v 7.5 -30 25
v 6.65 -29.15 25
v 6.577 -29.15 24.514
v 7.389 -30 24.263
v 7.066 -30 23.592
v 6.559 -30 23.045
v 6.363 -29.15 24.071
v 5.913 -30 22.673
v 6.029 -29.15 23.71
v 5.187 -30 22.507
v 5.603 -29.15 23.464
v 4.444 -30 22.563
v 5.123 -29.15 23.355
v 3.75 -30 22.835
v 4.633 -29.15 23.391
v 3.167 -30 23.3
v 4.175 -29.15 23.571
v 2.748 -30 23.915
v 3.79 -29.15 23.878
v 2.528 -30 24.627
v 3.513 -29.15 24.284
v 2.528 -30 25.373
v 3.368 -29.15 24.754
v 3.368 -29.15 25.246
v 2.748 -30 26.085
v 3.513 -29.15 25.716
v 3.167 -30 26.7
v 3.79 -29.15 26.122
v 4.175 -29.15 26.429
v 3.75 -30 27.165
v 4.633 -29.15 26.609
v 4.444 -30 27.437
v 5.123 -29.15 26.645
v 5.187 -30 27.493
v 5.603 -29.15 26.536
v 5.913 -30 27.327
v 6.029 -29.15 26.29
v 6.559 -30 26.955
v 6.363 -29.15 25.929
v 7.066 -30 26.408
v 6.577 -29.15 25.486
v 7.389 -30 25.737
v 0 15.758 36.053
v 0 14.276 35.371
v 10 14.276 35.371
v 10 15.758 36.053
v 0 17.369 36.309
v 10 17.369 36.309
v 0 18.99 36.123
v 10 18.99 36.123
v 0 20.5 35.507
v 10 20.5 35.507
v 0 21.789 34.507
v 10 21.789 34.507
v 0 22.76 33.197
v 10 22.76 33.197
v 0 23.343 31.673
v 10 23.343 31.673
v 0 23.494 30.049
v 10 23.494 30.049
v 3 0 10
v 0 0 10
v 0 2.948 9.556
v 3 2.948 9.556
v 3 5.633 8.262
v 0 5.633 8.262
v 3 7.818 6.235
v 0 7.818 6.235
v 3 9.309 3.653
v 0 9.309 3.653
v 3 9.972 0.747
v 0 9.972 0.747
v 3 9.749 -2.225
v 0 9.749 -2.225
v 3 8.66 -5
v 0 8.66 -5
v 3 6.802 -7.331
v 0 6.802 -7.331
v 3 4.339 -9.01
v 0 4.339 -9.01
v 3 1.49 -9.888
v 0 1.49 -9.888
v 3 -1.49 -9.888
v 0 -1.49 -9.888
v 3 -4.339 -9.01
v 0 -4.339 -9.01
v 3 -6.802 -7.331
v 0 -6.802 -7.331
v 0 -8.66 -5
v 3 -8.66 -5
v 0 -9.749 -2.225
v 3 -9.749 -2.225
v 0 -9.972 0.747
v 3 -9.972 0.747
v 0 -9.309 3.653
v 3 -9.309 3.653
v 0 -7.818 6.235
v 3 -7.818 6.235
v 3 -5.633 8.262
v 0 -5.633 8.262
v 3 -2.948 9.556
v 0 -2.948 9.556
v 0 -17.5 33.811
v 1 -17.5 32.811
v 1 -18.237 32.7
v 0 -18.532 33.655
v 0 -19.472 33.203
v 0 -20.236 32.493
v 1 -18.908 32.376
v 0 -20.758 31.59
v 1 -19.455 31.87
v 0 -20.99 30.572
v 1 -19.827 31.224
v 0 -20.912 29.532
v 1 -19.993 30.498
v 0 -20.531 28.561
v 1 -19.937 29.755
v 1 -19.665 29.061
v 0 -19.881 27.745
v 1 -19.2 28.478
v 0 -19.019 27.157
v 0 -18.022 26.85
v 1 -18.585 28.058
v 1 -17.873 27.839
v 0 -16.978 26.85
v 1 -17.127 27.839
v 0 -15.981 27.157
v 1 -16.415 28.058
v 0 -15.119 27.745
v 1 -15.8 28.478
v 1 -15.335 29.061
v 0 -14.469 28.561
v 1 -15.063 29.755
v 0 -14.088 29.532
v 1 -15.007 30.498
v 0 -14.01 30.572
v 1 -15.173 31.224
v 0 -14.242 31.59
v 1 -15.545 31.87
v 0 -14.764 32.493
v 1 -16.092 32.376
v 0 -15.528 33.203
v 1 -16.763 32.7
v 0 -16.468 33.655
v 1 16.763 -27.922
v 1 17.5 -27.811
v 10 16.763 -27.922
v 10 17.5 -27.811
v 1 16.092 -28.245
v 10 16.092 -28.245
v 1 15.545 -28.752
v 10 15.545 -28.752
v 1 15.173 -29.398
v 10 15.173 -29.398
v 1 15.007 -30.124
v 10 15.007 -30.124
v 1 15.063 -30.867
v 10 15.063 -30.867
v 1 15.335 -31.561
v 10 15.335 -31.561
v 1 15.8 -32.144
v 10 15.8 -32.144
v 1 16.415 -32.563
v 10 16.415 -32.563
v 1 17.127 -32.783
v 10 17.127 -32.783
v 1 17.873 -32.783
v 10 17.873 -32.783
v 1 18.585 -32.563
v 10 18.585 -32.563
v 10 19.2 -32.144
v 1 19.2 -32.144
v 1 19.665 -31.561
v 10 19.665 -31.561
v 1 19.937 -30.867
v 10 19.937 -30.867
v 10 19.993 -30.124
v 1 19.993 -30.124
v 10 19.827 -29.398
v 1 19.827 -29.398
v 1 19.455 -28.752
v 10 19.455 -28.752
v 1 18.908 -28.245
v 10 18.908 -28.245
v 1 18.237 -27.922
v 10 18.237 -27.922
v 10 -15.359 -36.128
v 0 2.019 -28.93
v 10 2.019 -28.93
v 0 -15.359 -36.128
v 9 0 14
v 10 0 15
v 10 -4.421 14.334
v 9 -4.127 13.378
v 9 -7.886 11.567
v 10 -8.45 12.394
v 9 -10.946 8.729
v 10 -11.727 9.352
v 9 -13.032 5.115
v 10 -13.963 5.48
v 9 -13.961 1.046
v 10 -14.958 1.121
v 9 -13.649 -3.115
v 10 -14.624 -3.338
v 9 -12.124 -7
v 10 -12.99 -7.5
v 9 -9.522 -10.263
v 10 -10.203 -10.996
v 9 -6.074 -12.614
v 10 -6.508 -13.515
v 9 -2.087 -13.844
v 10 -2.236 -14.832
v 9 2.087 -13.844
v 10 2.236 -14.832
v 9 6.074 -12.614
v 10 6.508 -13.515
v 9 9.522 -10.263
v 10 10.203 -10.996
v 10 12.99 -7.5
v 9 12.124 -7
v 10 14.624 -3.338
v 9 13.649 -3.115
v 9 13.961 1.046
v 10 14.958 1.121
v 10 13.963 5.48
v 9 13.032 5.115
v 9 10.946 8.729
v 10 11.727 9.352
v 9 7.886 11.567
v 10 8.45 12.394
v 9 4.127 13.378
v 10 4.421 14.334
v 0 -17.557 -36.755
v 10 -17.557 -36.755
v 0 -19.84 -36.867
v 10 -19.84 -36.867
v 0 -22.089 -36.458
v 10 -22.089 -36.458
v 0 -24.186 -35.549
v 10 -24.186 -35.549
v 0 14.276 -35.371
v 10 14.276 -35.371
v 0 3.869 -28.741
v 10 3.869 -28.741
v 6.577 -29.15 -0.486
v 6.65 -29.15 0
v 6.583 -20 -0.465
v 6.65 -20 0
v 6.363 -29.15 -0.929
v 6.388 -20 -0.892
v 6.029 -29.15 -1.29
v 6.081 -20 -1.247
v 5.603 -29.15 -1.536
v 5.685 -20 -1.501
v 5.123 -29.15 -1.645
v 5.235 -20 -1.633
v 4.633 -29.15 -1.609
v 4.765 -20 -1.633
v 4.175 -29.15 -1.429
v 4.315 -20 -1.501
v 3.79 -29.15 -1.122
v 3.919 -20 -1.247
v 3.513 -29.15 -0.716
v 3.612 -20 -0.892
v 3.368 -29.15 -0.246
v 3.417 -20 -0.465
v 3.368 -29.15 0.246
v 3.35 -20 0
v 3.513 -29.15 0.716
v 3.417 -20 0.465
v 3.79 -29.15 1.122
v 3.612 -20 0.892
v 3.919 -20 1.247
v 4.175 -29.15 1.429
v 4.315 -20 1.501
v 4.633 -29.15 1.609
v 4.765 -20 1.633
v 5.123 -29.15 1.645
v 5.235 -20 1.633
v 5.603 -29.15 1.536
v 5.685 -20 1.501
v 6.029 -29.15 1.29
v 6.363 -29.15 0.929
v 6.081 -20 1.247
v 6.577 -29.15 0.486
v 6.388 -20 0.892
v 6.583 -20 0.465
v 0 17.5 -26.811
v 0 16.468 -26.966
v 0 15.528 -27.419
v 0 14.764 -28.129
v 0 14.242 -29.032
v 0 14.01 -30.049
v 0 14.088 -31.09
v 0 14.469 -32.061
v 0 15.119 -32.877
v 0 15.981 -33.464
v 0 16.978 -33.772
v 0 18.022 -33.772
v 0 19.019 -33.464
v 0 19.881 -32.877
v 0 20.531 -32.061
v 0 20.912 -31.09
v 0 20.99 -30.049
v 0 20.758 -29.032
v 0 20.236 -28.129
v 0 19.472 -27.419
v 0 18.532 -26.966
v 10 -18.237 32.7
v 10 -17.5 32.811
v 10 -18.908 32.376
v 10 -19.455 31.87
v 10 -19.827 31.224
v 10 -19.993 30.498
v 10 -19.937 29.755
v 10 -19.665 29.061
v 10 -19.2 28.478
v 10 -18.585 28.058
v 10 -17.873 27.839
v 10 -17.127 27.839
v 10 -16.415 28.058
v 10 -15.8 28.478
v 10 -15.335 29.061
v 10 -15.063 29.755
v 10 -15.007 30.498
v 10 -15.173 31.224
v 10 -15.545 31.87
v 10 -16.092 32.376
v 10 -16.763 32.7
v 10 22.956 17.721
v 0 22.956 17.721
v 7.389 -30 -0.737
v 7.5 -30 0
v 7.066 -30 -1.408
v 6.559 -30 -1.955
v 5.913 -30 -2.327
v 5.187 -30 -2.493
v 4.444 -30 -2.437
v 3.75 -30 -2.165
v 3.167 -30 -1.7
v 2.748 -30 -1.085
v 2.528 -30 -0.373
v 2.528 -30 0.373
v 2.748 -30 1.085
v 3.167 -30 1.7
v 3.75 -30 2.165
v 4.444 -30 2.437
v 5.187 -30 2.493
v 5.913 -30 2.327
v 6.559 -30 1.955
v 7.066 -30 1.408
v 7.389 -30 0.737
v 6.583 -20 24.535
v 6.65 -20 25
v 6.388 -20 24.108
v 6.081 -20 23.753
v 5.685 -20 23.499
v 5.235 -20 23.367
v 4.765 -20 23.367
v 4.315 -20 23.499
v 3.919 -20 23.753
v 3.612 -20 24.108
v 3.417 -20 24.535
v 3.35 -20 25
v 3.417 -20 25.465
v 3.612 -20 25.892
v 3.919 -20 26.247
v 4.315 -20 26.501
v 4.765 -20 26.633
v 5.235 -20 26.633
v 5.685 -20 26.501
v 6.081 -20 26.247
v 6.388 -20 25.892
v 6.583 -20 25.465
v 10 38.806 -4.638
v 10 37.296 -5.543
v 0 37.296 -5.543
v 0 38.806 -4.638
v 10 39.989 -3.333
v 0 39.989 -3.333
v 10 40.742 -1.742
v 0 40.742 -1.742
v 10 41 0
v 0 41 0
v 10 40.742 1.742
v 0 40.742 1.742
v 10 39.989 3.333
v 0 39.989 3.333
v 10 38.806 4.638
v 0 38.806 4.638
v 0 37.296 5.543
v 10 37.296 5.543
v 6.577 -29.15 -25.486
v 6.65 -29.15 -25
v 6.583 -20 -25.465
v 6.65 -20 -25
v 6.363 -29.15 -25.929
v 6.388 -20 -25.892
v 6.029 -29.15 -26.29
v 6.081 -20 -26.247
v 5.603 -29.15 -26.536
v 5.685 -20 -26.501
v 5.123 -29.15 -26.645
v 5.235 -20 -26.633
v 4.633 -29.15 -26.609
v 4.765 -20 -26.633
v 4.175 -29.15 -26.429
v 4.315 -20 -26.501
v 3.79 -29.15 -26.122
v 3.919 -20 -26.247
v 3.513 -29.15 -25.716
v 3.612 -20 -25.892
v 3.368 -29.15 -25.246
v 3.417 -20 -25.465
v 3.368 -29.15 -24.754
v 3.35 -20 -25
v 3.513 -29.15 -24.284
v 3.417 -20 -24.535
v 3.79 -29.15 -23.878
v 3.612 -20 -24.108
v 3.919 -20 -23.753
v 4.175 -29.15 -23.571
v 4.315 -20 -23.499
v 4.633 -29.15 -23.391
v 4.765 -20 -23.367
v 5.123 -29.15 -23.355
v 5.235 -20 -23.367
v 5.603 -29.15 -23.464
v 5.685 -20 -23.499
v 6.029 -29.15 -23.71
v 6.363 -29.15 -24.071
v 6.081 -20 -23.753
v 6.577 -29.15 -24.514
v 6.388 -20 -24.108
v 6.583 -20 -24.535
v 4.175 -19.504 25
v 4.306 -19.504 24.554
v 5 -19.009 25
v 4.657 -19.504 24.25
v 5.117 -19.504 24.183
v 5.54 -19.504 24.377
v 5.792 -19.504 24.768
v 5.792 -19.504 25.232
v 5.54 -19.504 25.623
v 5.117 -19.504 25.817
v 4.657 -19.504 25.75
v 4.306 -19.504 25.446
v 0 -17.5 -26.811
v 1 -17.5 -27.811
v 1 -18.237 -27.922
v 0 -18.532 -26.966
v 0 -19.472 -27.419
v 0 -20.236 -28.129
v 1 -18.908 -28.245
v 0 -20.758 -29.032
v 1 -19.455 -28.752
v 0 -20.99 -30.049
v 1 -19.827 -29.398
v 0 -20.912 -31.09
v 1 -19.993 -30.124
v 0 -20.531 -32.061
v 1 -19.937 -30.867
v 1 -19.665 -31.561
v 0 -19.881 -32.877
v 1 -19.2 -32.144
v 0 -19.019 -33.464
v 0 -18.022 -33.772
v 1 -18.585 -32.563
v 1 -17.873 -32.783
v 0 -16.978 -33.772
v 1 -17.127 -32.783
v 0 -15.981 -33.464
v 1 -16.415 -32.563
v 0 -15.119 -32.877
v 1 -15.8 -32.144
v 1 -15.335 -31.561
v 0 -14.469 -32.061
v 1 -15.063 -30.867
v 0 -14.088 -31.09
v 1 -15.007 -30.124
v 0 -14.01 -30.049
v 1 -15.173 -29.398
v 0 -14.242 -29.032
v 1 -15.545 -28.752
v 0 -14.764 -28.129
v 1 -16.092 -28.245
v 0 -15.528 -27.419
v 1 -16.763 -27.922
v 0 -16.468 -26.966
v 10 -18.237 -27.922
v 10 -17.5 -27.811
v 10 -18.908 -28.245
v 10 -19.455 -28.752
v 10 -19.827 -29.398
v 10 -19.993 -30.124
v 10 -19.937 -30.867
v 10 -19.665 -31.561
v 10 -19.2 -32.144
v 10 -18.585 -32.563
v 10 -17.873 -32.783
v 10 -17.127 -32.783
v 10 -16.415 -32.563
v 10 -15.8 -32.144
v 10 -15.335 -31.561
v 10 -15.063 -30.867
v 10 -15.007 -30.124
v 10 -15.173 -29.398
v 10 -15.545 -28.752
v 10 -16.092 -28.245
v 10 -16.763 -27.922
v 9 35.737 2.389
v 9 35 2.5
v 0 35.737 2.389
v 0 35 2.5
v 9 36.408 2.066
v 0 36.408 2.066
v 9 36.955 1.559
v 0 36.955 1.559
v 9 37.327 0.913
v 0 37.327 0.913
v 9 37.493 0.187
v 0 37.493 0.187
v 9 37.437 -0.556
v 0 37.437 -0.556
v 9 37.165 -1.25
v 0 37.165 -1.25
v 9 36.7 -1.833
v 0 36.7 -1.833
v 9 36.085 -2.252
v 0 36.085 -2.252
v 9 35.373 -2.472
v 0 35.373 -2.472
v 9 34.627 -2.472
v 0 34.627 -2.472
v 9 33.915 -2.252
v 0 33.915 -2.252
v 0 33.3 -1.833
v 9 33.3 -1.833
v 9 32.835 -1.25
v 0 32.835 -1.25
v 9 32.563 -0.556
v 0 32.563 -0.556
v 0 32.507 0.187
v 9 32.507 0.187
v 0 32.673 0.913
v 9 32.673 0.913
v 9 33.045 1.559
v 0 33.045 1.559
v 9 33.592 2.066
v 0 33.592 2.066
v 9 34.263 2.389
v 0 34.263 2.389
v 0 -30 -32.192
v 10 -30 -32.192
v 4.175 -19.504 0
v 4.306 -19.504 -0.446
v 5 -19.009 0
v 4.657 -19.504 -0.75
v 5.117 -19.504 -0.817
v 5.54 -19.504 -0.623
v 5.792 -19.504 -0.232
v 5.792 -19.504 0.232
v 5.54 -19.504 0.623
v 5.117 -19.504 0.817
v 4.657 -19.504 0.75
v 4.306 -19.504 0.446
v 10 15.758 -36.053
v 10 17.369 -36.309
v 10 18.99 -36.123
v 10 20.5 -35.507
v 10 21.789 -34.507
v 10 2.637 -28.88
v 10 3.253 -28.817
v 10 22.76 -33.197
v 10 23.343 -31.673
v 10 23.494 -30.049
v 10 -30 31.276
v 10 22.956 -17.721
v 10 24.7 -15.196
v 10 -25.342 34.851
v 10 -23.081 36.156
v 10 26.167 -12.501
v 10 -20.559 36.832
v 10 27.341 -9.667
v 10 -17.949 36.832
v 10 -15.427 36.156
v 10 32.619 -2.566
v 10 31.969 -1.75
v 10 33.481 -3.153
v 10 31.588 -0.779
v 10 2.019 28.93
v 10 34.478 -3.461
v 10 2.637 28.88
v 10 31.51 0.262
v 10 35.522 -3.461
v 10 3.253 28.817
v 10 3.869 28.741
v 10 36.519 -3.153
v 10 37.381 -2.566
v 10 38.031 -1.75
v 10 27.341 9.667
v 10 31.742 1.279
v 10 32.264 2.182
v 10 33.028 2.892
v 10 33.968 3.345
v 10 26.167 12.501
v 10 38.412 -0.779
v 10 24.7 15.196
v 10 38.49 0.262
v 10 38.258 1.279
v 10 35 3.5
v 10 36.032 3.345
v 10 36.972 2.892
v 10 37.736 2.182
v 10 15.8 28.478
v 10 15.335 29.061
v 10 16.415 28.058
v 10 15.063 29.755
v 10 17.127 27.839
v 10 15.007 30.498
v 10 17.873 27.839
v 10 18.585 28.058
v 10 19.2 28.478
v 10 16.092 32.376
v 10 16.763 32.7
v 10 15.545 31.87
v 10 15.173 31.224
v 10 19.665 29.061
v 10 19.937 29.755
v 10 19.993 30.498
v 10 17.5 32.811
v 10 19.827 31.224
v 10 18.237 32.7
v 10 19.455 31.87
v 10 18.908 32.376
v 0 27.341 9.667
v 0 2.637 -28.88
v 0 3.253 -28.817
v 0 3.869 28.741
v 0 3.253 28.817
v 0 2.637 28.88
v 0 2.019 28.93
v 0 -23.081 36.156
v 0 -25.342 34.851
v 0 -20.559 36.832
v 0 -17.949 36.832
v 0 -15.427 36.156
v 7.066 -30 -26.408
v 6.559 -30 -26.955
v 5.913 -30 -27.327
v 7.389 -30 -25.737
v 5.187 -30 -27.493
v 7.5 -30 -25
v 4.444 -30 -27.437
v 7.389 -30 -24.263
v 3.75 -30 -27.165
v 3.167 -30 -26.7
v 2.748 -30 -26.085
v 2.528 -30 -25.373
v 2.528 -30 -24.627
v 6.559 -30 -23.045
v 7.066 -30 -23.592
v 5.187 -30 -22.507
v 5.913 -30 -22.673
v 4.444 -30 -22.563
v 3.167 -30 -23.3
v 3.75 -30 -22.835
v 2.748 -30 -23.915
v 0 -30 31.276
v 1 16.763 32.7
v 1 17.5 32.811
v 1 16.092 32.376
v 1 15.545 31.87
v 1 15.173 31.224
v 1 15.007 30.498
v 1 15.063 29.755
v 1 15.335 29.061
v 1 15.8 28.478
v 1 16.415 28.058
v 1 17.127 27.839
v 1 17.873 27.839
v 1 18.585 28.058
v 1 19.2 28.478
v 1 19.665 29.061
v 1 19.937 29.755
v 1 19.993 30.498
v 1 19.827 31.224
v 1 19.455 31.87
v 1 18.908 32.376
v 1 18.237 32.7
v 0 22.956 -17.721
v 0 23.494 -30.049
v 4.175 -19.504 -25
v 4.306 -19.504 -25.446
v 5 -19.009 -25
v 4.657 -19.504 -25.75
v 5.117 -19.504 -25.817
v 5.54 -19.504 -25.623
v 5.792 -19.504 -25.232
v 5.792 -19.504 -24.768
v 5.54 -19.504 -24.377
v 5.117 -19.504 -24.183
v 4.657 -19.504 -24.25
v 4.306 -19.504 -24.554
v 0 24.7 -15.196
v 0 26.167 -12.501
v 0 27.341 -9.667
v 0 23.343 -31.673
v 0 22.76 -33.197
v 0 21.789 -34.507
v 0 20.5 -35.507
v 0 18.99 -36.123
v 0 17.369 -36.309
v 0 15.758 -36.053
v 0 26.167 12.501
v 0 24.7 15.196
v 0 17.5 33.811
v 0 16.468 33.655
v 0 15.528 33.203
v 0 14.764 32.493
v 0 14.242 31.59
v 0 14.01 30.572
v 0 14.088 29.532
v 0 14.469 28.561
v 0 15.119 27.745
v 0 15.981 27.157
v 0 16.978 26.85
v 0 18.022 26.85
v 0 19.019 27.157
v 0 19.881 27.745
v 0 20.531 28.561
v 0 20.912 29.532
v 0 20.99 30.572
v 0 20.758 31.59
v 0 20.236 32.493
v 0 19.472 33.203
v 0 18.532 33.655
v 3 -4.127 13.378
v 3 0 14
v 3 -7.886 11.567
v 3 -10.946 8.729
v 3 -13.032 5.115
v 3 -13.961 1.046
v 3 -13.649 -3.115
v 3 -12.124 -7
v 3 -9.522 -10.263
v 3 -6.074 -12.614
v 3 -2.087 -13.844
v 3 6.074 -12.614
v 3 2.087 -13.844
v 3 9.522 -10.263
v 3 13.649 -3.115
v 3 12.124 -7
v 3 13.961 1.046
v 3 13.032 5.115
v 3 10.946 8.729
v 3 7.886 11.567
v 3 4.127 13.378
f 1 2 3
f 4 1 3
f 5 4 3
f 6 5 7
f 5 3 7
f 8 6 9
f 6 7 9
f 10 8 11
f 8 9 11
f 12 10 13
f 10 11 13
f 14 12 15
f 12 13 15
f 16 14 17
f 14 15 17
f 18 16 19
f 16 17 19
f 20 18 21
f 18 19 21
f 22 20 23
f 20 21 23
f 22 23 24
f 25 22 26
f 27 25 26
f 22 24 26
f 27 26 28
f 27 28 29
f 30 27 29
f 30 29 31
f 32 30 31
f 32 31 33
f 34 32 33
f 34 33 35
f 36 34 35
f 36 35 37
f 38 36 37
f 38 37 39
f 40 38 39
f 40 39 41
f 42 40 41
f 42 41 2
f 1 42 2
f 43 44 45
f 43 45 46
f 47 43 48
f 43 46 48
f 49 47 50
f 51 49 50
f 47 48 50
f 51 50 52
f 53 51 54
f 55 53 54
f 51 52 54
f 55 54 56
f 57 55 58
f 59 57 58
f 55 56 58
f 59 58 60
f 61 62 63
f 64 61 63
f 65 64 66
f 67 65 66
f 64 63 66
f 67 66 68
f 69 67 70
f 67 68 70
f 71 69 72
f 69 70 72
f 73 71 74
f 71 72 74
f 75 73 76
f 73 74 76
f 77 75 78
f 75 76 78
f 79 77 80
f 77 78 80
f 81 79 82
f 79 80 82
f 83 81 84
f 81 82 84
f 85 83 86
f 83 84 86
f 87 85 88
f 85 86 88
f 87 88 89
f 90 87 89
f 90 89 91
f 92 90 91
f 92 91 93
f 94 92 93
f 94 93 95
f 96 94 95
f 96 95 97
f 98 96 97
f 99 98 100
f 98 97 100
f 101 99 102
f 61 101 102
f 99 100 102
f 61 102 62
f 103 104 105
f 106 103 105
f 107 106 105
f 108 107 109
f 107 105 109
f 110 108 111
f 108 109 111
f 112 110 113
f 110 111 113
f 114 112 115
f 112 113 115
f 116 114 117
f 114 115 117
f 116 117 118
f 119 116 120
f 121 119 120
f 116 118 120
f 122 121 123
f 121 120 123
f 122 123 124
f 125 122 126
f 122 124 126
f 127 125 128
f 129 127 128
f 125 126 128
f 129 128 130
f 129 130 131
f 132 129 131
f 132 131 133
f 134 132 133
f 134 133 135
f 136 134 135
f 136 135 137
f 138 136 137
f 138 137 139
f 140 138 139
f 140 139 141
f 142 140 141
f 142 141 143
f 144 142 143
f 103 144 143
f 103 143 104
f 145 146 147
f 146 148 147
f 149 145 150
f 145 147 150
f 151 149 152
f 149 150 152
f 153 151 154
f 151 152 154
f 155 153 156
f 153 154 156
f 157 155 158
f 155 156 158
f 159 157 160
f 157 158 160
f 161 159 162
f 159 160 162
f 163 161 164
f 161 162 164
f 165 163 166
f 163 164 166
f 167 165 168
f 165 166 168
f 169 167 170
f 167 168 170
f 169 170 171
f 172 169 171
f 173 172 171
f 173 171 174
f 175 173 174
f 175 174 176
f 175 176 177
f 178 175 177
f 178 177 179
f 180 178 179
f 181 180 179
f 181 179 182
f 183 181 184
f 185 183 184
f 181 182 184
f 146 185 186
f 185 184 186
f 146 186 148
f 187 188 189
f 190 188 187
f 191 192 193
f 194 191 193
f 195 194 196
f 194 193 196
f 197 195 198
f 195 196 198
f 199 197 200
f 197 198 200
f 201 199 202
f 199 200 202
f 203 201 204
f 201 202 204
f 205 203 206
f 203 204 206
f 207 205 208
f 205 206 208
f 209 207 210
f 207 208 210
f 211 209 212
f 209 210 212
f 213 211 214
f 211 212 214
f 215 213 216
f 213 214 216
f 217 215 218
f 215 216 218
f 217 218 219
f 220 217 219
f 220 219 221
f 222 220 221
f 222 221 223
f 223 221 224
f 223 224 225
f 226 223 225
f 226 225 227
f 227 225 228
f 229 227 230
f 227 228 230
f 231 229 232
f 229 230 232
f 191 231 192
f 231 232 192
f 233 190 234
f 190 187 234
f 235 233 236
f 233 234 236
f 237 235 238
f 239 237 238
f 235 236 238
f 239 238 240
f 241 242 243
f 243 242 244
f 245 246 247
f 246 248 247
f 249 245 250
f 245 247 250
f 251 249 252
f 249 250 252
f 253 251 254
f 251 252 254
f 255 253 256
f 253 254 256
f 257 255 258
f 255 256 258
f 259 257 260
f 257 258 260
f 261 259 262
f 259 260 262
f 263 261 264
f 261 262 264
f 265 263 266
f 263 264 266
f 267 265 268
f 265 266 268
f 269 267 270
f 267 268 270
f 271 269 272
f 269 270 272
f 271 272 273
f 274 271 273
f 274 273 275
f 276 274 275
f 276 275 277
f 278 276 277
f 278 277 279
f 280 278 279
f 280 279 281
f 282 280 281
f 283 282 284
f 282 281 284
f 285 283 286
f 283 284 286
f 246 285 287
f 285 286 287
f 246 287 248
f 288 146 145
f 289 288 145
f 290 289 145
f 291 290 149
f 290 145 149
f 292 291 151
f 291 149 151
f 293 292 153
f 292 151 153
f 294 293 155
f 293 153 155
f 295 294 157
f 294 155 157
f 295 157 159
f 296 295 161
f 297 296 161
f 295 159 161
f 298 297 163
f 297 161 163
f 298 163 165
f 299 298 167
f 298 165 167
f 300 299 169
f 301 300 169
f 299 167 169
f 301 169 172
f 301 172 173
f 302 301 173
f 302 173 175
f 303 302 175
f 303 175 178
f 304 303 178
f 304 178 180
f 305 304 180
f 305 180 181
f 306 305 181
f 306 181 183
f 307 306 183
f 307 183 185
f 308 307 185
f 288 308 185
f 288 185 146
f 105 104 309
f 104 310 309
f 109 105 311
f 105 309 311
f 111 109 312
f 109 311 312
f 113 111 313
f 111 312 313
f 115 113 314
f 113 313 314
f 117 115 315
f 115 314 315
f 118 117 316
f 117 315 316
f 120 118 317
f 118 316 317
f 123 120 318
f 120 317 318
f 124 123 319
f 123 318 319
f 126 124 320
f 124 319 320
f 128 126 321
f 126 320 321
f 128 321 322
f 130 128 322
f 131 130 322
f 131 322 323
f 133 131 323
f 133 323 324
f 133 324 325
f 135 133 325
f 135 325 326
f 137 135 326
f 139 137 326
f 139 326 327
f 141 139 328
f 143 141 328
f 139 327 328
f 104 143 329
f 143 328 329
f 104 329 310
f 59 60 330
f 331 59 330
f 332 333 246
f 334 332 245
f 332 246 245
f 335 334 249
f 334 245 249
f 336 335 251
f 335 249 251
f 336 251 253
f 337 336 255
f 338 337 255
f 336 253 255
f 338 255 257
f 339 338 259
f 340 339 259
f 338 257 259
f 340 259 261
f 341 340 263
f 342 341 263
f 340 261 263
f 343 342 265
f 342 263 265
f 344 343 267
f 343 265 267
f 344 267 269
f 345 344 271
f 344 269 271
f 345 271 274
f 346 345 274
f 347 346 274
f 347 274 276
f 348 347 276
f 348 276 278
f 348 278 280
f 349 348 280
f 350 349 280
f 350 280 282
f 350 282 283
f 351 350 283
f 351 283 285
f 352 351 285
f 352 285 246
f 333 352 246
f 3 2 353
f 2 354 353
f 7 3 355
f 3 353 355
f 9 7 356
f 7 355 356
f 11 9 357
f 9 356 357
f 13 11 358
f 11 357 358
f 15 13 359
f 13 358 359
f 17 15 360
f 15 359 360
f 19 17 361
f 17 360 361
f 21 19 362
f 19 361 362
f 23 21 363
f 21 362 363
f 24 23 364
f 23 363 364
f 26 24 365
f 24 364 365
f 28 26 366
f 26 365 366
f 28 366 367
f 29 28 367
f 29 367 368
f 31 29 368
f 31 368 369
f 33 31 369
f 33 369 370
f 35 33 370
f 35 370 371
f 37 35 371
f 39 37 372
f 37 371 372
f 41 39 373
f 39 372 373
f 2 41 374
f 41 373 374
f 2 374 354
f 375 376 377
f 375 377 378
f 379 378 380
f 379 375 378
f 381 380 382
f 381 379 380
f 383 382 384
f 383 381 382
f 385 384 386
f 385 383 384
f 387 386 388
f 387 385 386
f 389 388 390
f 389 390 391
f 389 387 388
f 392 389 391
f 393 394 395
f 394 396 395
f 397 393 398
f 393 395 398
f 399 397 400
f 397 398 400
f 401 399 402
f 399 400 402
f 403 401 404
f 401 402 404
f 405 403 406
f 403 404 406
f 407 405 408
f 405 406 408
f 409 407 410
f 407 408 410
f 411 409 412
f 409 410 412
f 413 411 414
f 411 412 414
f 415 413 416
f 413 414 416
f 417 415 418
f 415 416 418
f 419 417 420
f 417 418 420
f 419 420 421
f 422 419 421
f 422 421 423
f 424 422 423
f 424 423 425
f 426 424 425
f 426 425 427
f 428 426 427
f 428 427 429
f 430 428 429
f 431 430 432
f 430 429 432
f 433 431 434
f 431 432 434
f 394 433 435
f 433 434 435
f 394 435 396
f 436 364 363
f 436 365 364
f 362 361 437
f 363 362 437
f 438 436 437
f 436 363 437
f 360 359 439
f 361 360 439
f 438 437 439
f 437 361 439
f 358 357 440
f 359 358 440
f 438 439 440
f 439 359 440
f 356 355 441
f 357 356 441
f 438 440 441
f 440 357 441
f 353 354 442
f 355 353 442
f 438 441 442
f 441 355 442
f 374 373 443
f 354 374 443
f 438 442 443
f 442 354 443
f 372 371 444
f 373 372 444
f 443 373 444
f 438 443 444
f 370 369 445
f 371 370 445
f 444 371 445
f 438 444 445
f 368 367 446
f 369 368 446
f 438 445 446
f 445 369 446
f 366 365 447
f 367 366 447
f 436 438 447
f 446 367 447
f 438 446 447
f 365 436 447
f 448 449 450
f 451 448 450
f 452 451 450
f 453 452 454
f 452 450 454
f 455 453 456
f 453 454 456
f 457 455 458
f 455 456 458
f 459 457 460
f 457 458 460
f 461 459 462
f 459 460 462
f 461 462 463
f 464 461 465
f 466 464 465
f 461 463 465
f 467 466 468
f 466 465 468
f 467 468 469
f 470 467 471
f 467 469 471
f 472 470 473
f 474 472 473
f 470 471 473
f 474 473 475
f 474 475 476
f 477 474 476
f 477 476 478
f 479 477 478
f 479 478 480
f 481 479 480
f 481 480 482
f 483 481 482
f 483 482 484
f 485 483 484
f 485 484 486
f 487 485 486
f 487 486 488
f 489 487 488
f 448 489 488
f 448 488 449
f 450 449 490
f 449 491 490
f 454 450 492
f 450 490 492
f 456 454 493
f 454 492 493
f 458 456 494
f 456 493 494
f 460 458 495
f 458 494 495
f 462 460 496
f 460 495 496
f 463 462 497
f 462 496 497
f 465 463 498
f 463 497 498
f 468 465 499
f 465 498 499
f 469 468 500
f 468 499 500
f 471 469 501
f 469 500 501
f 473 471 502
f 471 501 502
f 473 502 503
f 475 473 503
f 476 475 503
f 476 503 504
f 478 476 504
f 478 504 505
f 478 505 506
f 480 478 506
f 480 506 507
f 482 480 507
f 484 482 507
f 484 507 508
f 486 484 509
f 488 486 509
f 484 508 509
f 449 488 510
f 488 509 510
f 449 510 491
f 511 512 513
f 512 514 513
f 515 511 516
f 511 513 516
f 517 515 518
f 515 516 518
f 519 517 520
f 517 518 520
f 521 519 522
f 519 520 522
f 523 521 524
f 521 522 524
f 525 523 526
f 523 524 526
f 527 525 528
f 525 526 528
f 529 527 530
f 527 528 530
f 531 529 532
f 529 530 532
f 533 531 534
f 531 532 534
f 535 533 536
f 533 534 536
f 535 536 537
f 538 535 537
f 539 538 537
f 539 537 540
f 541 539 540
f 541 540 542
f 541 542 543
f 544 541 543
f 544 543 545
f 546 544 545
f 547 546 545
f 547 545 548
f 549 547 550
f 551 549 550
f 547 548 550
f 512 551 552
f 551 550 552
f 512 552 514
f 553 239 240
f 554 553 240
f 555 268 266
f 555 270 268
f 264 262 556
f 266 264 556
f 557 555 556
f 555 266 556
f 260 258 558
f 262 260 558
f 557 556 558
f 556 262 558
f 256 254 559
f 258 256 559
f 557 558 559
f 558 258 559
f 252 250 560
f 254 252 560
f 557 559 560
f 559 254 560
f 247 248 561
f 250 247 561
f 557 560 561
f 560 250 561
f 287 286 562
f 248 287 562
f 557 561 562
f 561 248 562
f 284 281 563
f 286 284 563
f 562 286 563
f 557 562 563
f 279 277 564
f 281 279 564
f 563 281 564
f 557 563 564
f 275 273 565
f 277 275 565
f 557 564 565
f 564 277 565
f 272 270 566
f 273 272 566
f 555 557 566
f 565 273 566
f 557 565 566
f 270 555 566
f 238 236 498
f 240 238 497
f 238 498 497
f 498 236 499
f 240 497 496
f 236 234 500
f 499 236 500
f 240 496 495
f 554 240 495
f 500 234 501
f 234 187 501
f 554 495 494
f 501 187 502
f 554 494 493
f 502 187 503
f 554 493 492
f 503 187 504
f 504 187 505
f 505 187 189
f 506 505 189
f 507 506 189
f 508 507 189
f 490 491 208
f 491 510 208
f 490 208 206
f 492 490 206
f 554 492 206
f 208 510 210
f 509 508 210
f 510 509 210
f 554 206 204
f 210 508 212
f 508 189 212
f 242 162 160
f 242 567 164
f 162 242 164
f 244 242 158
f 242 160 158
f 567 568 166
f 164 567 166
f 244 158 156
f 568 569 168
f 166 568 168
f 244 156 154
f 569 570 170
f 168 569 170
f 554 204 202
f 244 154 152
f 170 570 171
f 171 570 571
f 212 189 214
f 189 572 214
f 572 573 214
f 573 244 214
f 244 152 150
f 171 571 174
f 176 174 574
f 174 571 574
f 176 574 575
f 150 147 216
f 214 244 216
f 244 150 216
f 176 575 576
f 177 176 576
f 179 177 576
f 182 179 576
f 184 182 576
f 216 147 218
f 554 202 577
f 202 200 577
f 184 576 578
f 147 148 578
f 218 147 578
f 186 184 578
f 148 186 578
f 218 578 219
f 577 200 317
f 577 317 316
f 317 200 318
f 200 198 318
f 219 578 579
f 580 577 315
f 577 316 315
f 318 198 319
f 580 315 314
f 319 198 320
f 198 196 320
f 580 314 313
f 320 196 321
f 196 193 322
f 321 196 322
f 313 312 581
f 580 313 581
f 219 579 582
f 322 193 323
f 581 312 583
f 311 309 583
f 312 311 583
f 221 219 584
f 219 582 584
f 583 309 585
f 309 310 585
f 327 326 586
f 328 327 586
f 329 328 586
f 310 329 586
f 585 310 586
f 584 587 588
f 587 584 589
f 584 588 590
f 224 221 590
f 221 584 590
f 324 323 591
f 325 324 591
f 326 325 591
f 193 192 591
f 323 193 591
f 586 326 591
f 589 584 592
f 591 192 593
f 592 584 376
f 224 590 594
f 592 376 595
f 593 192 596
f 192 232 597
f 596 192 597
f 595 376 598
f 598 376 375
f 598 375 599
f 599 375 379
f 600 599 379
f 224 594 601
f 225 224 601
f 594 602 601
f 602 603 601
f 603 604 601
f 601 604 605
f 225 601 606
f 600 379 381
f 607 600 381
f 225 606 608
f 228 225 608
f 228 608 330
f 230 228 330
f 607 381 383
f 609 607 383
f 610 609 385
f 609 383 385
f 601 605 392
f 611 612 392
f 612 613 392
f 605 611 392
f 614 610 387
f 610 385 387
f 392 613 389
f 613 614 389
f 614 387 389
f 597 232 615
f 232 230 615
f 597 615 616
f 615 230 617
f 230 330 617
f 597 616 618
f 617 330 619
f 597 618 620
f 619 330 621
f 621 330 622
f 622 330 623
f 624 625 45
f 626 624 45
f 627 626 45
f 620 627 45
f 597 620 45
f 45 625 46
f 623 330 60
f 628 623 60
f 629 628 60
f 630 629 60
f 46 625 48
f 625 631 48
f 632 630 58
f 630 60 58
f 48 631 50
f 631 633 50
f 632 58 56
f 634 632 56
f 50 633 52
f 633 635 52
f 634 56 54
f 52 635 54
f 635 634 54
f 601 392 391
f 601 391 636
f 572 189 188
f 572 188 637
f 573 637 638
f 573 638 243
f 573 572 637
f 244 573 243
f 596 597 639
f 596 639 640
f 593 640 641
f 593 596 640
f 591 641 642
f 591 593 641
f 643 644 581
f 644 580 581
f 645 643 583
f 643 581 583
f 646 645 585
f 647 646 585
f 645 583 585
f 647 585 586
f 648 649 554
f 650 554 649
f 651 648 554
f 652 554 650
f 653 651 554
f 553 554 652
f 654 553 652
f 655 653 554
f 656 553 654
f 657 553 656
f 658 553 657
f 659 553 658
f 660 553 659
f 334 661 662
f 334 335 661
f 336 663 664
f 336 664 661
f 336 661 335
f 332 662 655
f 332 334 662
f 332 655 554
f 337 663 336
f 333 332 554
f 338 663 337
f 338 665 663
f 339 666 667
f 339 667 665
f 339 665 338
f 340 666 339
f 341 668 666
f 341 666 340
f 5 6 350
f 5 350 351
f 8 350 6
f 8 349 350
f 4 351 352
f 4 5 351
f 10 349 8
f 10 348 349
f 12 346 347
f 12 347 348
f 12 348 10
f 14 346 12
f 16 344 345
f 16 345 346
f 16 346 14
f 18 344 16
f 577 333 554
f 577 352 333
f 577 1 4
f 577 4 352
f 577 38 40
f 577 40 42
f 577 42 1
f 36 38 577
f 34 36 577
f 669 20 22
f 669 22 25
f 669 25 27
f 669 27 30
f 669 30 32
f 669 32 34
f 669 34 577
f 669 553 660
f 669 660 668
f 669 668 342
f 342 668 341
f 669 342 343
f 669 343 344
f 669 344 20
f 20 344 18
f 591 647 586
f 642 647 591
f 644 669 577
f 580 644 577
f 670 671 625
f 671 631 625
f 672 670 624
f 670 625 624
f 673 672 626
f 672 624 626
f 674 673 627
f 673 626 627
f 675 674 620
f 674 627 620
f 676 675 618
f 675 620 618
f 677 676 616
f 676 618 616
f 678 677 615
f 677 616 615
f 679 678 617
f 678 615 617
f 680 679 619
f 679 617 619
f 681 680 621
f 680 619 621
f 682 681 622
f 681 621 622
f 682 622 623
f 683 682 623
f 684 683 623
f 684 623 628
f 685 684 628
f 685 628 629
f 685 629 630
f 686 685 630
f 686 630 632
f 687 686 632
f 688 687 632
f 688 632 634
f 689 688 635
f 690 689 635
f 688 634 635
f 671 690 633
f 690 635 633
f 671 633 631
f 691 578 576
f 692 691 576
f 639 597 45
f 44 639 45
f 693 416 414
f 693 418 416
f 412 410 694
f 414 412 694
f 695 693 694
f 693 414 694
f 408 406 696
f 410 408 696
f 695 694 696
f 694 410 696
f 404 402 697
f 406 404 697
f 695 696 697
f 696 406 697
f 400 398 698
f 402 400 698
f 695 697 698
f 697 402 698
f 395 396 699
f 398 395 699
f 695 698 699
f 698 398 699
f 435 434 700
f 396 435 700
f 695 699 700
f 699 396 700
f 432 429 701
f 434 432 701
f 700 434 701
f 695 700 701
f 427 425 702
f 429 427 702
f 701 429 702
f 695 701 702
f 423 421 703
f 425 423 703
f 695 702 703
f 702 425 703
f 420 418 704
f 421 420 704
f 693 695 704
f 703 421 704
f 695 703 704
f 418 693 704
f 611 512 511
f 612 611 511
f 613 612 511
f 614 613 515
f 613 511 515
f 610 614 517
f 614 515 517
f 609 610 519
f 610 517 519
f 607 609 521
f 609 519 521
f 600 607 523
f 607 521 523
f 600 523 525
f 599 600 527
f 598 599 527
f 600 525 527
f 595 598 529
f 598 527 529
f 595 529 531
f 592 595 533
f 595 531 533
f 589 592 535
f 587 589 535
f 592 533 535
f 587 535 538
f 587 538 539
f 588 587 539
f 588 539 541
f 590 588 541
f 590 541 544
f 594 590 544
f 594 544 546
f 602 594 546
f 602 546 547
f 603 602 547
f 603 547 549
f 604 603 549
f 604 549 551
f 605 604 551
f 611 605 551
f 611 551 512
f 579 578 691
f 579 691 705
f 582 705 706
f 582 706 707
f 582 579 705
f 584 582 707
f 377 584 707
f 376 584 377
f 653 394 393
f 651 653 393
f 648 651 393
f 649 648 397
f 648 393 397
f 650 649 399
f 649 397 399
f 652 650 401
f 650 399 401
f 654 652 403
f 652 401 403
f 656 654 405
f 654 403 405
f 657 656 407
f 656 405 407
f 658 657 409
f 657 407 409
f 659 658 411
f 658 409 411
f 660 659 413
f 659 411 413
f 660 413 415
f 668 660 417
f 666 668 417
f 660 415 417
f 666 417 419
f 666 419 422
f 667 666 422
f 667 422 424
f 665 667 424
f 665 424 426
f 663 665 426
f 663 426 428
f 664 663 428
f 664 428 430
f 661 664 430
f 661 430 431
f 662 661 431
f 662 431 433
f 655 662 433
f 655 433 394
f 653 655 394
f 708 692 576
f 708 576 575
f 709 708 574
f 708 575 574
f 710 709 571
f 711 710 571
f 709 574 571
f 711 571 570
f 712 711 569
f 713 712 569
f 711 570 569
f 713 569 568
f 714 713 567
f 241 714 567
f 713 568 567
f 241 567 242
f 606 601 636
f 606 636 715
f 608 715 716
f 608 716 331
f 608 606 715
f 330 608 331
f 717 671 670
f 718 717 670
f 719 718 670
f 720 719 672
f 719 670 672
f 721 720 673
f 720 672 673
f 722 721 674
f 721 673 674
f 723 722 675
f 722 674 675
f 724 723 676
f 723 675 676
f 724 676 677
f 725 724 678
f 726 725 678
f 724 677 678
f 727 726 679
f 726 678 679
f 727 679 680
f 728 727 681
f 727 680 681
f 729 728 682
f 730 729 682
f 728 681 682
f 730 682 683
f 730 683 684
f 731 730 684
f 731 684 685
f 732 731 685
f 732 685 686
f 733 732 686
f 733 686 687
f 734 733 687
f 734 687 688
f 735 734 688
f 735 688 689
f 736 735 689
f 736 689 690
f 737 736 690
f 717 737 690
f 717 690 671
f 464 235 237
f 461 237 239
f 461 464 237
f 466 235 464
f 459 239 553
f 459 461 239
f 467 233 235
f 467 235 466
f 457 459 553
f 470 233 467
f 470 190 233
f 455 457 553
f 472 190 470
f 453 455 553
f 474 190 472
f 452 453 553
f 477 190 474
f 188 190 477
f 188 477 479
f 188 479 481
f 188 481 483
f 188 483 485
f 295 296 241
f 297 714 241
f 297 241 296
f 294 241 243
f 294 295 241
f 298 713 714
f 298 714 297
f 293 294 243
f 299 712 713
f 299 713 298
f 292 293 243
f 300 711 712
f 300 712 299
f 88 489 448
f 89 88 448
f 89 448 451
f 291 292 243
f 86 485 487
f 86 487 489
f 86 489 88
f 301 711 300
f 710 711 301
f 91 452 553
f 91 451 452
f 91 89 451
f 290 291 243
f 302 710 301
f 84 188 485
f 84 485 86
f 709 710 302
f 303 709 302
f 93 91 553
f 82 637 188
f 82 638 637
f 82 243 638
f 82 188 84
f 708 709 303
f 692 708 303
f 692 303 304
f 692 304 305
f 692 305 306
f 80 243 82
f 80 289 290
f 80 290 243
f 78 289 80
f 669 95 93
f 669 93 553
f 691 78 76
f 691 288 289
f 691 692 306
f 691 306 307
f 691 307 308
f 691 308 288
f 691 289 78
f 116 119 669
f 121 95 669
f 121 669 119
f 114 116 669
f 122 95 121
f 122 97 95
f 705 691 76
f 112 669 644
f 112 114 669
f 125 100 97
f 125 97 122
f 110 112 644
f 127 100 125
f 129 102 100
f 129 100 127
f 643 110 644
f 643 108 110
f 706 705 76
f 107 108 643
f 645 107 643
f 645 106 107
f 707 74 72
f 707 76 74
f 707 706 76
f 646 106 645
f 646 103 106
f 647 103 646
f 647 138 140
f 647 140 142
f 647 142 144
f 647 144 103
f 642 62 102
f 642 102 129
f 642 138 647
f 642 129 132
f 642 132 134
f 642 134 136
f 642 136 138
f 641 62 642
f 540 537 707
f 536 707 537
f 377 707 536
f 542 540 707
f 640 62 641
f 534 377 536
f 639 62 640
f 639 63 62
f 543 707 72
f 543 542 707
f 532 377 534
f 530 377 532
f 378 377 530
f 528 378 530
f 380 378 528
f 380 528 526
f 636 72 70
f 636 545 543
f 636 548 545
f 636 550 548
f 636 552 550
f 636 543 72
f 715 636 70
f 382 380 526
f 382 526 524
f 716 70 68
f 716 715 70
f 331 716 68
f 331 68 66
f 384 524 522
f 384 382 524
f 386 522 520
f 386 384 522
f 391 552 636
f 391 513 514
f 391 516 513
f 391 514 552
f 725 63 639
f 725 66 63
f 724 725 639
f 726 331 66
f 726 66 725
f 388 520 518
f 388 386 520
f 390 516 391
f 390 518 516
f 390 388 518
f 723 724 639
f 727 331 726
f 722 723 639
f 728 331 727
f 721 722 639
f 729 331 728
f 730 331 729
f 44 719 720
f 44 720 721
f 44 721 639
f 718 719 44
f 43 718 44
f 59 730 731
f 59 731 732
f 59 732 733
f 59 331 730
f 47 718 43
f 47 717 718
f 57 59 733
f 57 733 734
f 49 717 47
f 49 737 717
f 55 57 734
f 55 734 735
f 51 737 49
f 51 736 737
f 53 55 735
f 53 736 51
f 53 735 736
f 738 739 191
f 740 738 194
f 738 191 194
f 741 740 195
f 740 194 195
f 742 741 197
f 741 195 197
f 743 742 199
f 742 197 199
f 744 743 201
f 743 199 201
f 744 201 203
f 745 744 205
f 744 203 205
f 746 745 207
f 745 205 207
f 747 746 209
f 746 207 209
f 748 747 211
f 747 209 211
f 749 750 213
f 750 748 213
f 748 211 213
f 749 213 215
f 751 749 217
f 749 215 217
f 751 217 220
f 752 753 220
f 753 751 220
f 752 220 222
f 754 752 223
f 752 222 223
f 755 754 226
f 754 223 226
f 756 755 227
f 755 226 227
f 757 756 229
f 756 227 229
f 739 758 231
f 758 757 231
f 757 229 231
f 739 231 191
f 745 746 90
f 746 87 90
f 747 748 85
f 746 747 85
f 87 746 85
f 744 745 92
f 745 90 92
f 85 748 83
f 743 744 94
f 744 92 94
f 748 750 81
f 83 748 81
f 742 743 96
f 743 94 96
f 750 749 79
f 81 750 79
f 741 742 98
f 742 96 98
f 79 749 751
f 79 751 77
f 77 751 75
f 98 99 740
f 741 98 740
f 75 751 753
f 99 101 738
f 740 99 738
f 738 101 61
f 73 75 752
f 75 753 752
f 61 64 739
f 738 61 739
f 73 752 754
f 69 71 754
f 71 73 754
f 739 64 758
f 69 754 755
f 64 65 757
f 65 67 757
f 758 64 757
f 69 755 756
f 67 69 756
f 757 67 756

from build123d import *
from OCP.BRepFilletAPI import BRepFilletAPI_MakeChamfer

# Parameters (mm, degrees)
SKETCH_1_W                  = 10
SKETCH_1_H                  = 15
SKETCH_6_R                  = 14
SKETCH_6_R_2                = 10
EXTRUDE_1_DEPTH             = 3
SKETCH_7_R                  = 19.5
EXTRUDE_2_DEPTH             = 10
EXTRUDE_START               = -10
EXTRUDE_3_DEPTH             = 10
EXTRUDE_4_DEPTH             = 10
HOLE_WIZARD_M43_D           = 3.3
HOLE_WIZARD_M43_DEPTH       = 10
HOLE_WIZARD_M43_CSINK_D     = 5
HOLE_WIZARD_M43_CSINK_ANGLE = 90
HOLE_WIZARD_M43_TIP         = 0.991420021
HOLE_WIZARD_M61_D           = 5
HOLE_WIZARD_M61_CSINK_D     = 7
HOLE_WIZARD_M61_CSINK_ANGLE = 90
HOLE_WIZARD_M62_D           = 5
HOLE_WIZARD_M62_CSINK_D     = 7
HOLE_WIZARD_M62_CSINK_ANGLE = 90
CHAMFER_1_SIZE              = 1
CHAMFER_2_SIZE              = 10
CHAMFER_2_SIZE2             = 10.916011313
FILLET_1_R                  = 10


with BuildPart() as part:
    # Эскиз1 → Повернуть1 (revolve)
    with BuildSketch(Plane.XY, mode=Mode.PRIVATE) as revolve_1_sk:
        with Locations((5, 21.5)):
            Rectangle(SKETCH_1_W, SKETCH_1_H)
    revolve(revolve_1_sk.sketch.rotate(Axis((-29.36512031, 0, 0), (1, 0, 0)), 90), axis=Axis((-29.36512031, 0, 0), (1, 0, 0)))

    # Эскиз6 → Бобышка-Вытянуть1 (add)
    with BuildSketch(Plane.ZY):
        Circle(SKETCH_6_R)
        Circle(SKETCH_6_R_2, mode=Mode.SUBTRACT)
    extrude(amount=-EXTRUDE_1_DEPTH)

    # Эскиз7 → Бобышка-Вытянуть2 (add)
    with BuildSketch(Plane.ZY):
        with BuildLine():
            Line((-42.192192379, -30), (42.192192379, -30))
            Line((42.192192379, -30), (25.406687144, 10.52379439))
            ThreePointArc((25.406687144, 10.52379439), (0, 27.5), (-25.406687144, 10.52379439))
            Line((-25.406687144, 10.52379439), (-42.192192379, -30))
        make_face()
        Circle(SKETCH_7_R, mode=Mode.SUBTRACT)
    extrude(amount=-EXTRUDE_2_DEPTH)

    # Эскиз10 → Бобышка-Вытянуть3 (add)
    with BuildSketch(Plane.ZY.offset(EXTRUDE_START)):
        with BuildLine():
            Line((-35.371237807, 14.27620235), (-28.740816158, 3.868525117))
            ThreePointArc((-28.740816158, 3.868525117), (-25.11473671, 14.5), (-17.720649105, 22.95601436))
            Line((-17.720649105, 22.95601436), (-30.049172808, 23.494289329))
            ThreePointArc((-30.049172808, 23.494289329), (-35.507041555, 20.5), (-35.371237807, 14.27620235))
        make_face()
        with BuildLine():
            Line((30.049172808, 23.494289329), (17.720649105, 22.95601436))
            ThreePointArc((17.720649105, 22.95601436), (25.11473671, 14.5), (28.740816158, 3.868525117))
            Line((28.740816158, 3.868525117), (35.371237807, 14.27620235))
            ThreePointArc((35.371237807, 14.27620235), (35.507041555, 20.5), (30.049172808, 23.494289329))
        make_face()
    extrude(amount=EXTRUDE_3_DEPTH)

    # Эскиз14 → Бобышка-Вытянуть4 (add)
    with BuildSketch(Plane(origin=(10, 0, 0), x_dir=(0, 0, -1), z_dir=(1, 0, 0))):
        with BuildLine():
            Line((-5.543277195, 37.296100594), (-9.666616005, 27.341480118))
            ThreePointArc((-9.666616005, 27.341480118), (0, 29), (9.666616005, 27.341480118))
            Line((9.666616005, 27.341480118), (5.543277195, 37.296100594))
            ThreePointArc((5.543277195, 37.296100594), (0, 41), (-5.543277195, 37.296100594))
        make_face()
    extrude(amount=-EXTRUDE_4_DEPTH)

    # Отверстие обработанное метчиком M43
    with Locations(Plane(origin=(0, -30, 0), x_dir=(-1, 0, 0), z_dir=(0, -1, 0))):
        with Locations((-5, 0), (-5, 25), (-5, -25)):
            CounterSinkHole(HOLE_WIZARD_M43_D / 2, HOLE_WIZARD_M43_CSINK_D / 2, depth=HOLE_WIZARD_M43_DEPTH, counter_sink_angle=HOLE_WIZARD_M43_CSINK_ANGLE)
            with Locations((0, 0, -(HOLE_WIZARD_M43_DEPTH + HOLE_WIZARD_M43_TIP / 2))):  # 118° drill point
                Cone(0, HOLE_WIZARD_M43_D / 2, HOLE_WIZARD_M43_TIP, mode=Mode.SUBTRACT)

    # Отверстие обработанное метчиком M61 (through all)
    with Locations(Plane(origin=(0, 0, 0), x_dir=(0, 0, -1), z_dir=(-1, 0, 0))):
        with Locations((30.310889132, -17.5), (-30.310889132, -17.5), (-30.310889132, 17.5), (30.310889132, 17.5)):
            CounterSinkHole(HOLE_WIZARD_M61_D / 2, HOLE_WIZARD_M61_CSINK_D / 2, counter_sink_angle=HOLE_WIZARD_M61_CSINK_ANGLE)

    # Отверстие обработанное метчиком M62 (through all)
    with Locations(Plane(origin=(10, 0, 0), x_dir=(0, 0, -1), z_dir=(1, 0, 0))):
        with Locations((0, 35)):
            CounterSinkHole(HOLE_WIZARD_M62_D / 2, HOLE_WIZARD_M62_CSINK_D / 2, counter_sink_angle=HOLE_WIZARD_M62_CSINK_ANGLE)

    # Фаска1
    chamfer_1_edges = [part.edges().sort_by_distance(p)[0] for p in [
        (10, 0, -14),
    ]]
    chamfer(chamfer_1_edges, length=CHAMFER_1_SIZE)

    # Фаска2: one chamfer whose edges measure the first distance from different faces: ONE call of the kernel's chamfer builder (chamfer() names one face for all edges)
    chamfer_2_edges_1 = [part.edges().sort_by_distance(p)[0] for p in [
        (5, -30, -42.192192379),
    ]]
    chamfer_2_side_1 = [part.faces().sort_by_distance(p)[0] for p in [
        (5, -30, -41.342443923),
    ]]
    chamfer_2_edges_2 = [part.edges().sort_by_distance(p)[0] for p in [
        (5, -30, 42.192192379),
    ]]
    chamfer_2_side_2 = [part.faces().sort_by_distance(p)[0] for p in [
        (5, -13.990709354, 35.56092707),
    ]]
    chamfer_2 = BRepFilletAPI_MakeChamfer(part.part.solid().wrapped)
    for e in chamfer_2_edges_1:
        chamfer_2.Add(CHAMFER_2_SIZE, CHAMFER_2_SIZE2, e.wrapped, chamfer_2_side_1[0].wrapped)  # the first distance lies on this face
    for e in chamfer_2_edges_2:
        chamfer_2.Add(CHAMFER_2_SIZE, CHAMFER_2_SIZE2, e.wrapped, chamfer_2_side_2[0].wrapped)  # the first distance lies on this face
    add(Compound.cast(chamfer_2.Shape()), mode=Mode.REPLACE)

    # Скругление1
    fillet_1_edges = [part.edges().sort_by_distance(p)[0] for p in [
        (5, -20.761204675, 38.365358056),
        (5, -19.914920571, -38.014815702),
    ]]
    fillet(fillet_1_edges, radius=FILLET_1_R)


solid = part.part
